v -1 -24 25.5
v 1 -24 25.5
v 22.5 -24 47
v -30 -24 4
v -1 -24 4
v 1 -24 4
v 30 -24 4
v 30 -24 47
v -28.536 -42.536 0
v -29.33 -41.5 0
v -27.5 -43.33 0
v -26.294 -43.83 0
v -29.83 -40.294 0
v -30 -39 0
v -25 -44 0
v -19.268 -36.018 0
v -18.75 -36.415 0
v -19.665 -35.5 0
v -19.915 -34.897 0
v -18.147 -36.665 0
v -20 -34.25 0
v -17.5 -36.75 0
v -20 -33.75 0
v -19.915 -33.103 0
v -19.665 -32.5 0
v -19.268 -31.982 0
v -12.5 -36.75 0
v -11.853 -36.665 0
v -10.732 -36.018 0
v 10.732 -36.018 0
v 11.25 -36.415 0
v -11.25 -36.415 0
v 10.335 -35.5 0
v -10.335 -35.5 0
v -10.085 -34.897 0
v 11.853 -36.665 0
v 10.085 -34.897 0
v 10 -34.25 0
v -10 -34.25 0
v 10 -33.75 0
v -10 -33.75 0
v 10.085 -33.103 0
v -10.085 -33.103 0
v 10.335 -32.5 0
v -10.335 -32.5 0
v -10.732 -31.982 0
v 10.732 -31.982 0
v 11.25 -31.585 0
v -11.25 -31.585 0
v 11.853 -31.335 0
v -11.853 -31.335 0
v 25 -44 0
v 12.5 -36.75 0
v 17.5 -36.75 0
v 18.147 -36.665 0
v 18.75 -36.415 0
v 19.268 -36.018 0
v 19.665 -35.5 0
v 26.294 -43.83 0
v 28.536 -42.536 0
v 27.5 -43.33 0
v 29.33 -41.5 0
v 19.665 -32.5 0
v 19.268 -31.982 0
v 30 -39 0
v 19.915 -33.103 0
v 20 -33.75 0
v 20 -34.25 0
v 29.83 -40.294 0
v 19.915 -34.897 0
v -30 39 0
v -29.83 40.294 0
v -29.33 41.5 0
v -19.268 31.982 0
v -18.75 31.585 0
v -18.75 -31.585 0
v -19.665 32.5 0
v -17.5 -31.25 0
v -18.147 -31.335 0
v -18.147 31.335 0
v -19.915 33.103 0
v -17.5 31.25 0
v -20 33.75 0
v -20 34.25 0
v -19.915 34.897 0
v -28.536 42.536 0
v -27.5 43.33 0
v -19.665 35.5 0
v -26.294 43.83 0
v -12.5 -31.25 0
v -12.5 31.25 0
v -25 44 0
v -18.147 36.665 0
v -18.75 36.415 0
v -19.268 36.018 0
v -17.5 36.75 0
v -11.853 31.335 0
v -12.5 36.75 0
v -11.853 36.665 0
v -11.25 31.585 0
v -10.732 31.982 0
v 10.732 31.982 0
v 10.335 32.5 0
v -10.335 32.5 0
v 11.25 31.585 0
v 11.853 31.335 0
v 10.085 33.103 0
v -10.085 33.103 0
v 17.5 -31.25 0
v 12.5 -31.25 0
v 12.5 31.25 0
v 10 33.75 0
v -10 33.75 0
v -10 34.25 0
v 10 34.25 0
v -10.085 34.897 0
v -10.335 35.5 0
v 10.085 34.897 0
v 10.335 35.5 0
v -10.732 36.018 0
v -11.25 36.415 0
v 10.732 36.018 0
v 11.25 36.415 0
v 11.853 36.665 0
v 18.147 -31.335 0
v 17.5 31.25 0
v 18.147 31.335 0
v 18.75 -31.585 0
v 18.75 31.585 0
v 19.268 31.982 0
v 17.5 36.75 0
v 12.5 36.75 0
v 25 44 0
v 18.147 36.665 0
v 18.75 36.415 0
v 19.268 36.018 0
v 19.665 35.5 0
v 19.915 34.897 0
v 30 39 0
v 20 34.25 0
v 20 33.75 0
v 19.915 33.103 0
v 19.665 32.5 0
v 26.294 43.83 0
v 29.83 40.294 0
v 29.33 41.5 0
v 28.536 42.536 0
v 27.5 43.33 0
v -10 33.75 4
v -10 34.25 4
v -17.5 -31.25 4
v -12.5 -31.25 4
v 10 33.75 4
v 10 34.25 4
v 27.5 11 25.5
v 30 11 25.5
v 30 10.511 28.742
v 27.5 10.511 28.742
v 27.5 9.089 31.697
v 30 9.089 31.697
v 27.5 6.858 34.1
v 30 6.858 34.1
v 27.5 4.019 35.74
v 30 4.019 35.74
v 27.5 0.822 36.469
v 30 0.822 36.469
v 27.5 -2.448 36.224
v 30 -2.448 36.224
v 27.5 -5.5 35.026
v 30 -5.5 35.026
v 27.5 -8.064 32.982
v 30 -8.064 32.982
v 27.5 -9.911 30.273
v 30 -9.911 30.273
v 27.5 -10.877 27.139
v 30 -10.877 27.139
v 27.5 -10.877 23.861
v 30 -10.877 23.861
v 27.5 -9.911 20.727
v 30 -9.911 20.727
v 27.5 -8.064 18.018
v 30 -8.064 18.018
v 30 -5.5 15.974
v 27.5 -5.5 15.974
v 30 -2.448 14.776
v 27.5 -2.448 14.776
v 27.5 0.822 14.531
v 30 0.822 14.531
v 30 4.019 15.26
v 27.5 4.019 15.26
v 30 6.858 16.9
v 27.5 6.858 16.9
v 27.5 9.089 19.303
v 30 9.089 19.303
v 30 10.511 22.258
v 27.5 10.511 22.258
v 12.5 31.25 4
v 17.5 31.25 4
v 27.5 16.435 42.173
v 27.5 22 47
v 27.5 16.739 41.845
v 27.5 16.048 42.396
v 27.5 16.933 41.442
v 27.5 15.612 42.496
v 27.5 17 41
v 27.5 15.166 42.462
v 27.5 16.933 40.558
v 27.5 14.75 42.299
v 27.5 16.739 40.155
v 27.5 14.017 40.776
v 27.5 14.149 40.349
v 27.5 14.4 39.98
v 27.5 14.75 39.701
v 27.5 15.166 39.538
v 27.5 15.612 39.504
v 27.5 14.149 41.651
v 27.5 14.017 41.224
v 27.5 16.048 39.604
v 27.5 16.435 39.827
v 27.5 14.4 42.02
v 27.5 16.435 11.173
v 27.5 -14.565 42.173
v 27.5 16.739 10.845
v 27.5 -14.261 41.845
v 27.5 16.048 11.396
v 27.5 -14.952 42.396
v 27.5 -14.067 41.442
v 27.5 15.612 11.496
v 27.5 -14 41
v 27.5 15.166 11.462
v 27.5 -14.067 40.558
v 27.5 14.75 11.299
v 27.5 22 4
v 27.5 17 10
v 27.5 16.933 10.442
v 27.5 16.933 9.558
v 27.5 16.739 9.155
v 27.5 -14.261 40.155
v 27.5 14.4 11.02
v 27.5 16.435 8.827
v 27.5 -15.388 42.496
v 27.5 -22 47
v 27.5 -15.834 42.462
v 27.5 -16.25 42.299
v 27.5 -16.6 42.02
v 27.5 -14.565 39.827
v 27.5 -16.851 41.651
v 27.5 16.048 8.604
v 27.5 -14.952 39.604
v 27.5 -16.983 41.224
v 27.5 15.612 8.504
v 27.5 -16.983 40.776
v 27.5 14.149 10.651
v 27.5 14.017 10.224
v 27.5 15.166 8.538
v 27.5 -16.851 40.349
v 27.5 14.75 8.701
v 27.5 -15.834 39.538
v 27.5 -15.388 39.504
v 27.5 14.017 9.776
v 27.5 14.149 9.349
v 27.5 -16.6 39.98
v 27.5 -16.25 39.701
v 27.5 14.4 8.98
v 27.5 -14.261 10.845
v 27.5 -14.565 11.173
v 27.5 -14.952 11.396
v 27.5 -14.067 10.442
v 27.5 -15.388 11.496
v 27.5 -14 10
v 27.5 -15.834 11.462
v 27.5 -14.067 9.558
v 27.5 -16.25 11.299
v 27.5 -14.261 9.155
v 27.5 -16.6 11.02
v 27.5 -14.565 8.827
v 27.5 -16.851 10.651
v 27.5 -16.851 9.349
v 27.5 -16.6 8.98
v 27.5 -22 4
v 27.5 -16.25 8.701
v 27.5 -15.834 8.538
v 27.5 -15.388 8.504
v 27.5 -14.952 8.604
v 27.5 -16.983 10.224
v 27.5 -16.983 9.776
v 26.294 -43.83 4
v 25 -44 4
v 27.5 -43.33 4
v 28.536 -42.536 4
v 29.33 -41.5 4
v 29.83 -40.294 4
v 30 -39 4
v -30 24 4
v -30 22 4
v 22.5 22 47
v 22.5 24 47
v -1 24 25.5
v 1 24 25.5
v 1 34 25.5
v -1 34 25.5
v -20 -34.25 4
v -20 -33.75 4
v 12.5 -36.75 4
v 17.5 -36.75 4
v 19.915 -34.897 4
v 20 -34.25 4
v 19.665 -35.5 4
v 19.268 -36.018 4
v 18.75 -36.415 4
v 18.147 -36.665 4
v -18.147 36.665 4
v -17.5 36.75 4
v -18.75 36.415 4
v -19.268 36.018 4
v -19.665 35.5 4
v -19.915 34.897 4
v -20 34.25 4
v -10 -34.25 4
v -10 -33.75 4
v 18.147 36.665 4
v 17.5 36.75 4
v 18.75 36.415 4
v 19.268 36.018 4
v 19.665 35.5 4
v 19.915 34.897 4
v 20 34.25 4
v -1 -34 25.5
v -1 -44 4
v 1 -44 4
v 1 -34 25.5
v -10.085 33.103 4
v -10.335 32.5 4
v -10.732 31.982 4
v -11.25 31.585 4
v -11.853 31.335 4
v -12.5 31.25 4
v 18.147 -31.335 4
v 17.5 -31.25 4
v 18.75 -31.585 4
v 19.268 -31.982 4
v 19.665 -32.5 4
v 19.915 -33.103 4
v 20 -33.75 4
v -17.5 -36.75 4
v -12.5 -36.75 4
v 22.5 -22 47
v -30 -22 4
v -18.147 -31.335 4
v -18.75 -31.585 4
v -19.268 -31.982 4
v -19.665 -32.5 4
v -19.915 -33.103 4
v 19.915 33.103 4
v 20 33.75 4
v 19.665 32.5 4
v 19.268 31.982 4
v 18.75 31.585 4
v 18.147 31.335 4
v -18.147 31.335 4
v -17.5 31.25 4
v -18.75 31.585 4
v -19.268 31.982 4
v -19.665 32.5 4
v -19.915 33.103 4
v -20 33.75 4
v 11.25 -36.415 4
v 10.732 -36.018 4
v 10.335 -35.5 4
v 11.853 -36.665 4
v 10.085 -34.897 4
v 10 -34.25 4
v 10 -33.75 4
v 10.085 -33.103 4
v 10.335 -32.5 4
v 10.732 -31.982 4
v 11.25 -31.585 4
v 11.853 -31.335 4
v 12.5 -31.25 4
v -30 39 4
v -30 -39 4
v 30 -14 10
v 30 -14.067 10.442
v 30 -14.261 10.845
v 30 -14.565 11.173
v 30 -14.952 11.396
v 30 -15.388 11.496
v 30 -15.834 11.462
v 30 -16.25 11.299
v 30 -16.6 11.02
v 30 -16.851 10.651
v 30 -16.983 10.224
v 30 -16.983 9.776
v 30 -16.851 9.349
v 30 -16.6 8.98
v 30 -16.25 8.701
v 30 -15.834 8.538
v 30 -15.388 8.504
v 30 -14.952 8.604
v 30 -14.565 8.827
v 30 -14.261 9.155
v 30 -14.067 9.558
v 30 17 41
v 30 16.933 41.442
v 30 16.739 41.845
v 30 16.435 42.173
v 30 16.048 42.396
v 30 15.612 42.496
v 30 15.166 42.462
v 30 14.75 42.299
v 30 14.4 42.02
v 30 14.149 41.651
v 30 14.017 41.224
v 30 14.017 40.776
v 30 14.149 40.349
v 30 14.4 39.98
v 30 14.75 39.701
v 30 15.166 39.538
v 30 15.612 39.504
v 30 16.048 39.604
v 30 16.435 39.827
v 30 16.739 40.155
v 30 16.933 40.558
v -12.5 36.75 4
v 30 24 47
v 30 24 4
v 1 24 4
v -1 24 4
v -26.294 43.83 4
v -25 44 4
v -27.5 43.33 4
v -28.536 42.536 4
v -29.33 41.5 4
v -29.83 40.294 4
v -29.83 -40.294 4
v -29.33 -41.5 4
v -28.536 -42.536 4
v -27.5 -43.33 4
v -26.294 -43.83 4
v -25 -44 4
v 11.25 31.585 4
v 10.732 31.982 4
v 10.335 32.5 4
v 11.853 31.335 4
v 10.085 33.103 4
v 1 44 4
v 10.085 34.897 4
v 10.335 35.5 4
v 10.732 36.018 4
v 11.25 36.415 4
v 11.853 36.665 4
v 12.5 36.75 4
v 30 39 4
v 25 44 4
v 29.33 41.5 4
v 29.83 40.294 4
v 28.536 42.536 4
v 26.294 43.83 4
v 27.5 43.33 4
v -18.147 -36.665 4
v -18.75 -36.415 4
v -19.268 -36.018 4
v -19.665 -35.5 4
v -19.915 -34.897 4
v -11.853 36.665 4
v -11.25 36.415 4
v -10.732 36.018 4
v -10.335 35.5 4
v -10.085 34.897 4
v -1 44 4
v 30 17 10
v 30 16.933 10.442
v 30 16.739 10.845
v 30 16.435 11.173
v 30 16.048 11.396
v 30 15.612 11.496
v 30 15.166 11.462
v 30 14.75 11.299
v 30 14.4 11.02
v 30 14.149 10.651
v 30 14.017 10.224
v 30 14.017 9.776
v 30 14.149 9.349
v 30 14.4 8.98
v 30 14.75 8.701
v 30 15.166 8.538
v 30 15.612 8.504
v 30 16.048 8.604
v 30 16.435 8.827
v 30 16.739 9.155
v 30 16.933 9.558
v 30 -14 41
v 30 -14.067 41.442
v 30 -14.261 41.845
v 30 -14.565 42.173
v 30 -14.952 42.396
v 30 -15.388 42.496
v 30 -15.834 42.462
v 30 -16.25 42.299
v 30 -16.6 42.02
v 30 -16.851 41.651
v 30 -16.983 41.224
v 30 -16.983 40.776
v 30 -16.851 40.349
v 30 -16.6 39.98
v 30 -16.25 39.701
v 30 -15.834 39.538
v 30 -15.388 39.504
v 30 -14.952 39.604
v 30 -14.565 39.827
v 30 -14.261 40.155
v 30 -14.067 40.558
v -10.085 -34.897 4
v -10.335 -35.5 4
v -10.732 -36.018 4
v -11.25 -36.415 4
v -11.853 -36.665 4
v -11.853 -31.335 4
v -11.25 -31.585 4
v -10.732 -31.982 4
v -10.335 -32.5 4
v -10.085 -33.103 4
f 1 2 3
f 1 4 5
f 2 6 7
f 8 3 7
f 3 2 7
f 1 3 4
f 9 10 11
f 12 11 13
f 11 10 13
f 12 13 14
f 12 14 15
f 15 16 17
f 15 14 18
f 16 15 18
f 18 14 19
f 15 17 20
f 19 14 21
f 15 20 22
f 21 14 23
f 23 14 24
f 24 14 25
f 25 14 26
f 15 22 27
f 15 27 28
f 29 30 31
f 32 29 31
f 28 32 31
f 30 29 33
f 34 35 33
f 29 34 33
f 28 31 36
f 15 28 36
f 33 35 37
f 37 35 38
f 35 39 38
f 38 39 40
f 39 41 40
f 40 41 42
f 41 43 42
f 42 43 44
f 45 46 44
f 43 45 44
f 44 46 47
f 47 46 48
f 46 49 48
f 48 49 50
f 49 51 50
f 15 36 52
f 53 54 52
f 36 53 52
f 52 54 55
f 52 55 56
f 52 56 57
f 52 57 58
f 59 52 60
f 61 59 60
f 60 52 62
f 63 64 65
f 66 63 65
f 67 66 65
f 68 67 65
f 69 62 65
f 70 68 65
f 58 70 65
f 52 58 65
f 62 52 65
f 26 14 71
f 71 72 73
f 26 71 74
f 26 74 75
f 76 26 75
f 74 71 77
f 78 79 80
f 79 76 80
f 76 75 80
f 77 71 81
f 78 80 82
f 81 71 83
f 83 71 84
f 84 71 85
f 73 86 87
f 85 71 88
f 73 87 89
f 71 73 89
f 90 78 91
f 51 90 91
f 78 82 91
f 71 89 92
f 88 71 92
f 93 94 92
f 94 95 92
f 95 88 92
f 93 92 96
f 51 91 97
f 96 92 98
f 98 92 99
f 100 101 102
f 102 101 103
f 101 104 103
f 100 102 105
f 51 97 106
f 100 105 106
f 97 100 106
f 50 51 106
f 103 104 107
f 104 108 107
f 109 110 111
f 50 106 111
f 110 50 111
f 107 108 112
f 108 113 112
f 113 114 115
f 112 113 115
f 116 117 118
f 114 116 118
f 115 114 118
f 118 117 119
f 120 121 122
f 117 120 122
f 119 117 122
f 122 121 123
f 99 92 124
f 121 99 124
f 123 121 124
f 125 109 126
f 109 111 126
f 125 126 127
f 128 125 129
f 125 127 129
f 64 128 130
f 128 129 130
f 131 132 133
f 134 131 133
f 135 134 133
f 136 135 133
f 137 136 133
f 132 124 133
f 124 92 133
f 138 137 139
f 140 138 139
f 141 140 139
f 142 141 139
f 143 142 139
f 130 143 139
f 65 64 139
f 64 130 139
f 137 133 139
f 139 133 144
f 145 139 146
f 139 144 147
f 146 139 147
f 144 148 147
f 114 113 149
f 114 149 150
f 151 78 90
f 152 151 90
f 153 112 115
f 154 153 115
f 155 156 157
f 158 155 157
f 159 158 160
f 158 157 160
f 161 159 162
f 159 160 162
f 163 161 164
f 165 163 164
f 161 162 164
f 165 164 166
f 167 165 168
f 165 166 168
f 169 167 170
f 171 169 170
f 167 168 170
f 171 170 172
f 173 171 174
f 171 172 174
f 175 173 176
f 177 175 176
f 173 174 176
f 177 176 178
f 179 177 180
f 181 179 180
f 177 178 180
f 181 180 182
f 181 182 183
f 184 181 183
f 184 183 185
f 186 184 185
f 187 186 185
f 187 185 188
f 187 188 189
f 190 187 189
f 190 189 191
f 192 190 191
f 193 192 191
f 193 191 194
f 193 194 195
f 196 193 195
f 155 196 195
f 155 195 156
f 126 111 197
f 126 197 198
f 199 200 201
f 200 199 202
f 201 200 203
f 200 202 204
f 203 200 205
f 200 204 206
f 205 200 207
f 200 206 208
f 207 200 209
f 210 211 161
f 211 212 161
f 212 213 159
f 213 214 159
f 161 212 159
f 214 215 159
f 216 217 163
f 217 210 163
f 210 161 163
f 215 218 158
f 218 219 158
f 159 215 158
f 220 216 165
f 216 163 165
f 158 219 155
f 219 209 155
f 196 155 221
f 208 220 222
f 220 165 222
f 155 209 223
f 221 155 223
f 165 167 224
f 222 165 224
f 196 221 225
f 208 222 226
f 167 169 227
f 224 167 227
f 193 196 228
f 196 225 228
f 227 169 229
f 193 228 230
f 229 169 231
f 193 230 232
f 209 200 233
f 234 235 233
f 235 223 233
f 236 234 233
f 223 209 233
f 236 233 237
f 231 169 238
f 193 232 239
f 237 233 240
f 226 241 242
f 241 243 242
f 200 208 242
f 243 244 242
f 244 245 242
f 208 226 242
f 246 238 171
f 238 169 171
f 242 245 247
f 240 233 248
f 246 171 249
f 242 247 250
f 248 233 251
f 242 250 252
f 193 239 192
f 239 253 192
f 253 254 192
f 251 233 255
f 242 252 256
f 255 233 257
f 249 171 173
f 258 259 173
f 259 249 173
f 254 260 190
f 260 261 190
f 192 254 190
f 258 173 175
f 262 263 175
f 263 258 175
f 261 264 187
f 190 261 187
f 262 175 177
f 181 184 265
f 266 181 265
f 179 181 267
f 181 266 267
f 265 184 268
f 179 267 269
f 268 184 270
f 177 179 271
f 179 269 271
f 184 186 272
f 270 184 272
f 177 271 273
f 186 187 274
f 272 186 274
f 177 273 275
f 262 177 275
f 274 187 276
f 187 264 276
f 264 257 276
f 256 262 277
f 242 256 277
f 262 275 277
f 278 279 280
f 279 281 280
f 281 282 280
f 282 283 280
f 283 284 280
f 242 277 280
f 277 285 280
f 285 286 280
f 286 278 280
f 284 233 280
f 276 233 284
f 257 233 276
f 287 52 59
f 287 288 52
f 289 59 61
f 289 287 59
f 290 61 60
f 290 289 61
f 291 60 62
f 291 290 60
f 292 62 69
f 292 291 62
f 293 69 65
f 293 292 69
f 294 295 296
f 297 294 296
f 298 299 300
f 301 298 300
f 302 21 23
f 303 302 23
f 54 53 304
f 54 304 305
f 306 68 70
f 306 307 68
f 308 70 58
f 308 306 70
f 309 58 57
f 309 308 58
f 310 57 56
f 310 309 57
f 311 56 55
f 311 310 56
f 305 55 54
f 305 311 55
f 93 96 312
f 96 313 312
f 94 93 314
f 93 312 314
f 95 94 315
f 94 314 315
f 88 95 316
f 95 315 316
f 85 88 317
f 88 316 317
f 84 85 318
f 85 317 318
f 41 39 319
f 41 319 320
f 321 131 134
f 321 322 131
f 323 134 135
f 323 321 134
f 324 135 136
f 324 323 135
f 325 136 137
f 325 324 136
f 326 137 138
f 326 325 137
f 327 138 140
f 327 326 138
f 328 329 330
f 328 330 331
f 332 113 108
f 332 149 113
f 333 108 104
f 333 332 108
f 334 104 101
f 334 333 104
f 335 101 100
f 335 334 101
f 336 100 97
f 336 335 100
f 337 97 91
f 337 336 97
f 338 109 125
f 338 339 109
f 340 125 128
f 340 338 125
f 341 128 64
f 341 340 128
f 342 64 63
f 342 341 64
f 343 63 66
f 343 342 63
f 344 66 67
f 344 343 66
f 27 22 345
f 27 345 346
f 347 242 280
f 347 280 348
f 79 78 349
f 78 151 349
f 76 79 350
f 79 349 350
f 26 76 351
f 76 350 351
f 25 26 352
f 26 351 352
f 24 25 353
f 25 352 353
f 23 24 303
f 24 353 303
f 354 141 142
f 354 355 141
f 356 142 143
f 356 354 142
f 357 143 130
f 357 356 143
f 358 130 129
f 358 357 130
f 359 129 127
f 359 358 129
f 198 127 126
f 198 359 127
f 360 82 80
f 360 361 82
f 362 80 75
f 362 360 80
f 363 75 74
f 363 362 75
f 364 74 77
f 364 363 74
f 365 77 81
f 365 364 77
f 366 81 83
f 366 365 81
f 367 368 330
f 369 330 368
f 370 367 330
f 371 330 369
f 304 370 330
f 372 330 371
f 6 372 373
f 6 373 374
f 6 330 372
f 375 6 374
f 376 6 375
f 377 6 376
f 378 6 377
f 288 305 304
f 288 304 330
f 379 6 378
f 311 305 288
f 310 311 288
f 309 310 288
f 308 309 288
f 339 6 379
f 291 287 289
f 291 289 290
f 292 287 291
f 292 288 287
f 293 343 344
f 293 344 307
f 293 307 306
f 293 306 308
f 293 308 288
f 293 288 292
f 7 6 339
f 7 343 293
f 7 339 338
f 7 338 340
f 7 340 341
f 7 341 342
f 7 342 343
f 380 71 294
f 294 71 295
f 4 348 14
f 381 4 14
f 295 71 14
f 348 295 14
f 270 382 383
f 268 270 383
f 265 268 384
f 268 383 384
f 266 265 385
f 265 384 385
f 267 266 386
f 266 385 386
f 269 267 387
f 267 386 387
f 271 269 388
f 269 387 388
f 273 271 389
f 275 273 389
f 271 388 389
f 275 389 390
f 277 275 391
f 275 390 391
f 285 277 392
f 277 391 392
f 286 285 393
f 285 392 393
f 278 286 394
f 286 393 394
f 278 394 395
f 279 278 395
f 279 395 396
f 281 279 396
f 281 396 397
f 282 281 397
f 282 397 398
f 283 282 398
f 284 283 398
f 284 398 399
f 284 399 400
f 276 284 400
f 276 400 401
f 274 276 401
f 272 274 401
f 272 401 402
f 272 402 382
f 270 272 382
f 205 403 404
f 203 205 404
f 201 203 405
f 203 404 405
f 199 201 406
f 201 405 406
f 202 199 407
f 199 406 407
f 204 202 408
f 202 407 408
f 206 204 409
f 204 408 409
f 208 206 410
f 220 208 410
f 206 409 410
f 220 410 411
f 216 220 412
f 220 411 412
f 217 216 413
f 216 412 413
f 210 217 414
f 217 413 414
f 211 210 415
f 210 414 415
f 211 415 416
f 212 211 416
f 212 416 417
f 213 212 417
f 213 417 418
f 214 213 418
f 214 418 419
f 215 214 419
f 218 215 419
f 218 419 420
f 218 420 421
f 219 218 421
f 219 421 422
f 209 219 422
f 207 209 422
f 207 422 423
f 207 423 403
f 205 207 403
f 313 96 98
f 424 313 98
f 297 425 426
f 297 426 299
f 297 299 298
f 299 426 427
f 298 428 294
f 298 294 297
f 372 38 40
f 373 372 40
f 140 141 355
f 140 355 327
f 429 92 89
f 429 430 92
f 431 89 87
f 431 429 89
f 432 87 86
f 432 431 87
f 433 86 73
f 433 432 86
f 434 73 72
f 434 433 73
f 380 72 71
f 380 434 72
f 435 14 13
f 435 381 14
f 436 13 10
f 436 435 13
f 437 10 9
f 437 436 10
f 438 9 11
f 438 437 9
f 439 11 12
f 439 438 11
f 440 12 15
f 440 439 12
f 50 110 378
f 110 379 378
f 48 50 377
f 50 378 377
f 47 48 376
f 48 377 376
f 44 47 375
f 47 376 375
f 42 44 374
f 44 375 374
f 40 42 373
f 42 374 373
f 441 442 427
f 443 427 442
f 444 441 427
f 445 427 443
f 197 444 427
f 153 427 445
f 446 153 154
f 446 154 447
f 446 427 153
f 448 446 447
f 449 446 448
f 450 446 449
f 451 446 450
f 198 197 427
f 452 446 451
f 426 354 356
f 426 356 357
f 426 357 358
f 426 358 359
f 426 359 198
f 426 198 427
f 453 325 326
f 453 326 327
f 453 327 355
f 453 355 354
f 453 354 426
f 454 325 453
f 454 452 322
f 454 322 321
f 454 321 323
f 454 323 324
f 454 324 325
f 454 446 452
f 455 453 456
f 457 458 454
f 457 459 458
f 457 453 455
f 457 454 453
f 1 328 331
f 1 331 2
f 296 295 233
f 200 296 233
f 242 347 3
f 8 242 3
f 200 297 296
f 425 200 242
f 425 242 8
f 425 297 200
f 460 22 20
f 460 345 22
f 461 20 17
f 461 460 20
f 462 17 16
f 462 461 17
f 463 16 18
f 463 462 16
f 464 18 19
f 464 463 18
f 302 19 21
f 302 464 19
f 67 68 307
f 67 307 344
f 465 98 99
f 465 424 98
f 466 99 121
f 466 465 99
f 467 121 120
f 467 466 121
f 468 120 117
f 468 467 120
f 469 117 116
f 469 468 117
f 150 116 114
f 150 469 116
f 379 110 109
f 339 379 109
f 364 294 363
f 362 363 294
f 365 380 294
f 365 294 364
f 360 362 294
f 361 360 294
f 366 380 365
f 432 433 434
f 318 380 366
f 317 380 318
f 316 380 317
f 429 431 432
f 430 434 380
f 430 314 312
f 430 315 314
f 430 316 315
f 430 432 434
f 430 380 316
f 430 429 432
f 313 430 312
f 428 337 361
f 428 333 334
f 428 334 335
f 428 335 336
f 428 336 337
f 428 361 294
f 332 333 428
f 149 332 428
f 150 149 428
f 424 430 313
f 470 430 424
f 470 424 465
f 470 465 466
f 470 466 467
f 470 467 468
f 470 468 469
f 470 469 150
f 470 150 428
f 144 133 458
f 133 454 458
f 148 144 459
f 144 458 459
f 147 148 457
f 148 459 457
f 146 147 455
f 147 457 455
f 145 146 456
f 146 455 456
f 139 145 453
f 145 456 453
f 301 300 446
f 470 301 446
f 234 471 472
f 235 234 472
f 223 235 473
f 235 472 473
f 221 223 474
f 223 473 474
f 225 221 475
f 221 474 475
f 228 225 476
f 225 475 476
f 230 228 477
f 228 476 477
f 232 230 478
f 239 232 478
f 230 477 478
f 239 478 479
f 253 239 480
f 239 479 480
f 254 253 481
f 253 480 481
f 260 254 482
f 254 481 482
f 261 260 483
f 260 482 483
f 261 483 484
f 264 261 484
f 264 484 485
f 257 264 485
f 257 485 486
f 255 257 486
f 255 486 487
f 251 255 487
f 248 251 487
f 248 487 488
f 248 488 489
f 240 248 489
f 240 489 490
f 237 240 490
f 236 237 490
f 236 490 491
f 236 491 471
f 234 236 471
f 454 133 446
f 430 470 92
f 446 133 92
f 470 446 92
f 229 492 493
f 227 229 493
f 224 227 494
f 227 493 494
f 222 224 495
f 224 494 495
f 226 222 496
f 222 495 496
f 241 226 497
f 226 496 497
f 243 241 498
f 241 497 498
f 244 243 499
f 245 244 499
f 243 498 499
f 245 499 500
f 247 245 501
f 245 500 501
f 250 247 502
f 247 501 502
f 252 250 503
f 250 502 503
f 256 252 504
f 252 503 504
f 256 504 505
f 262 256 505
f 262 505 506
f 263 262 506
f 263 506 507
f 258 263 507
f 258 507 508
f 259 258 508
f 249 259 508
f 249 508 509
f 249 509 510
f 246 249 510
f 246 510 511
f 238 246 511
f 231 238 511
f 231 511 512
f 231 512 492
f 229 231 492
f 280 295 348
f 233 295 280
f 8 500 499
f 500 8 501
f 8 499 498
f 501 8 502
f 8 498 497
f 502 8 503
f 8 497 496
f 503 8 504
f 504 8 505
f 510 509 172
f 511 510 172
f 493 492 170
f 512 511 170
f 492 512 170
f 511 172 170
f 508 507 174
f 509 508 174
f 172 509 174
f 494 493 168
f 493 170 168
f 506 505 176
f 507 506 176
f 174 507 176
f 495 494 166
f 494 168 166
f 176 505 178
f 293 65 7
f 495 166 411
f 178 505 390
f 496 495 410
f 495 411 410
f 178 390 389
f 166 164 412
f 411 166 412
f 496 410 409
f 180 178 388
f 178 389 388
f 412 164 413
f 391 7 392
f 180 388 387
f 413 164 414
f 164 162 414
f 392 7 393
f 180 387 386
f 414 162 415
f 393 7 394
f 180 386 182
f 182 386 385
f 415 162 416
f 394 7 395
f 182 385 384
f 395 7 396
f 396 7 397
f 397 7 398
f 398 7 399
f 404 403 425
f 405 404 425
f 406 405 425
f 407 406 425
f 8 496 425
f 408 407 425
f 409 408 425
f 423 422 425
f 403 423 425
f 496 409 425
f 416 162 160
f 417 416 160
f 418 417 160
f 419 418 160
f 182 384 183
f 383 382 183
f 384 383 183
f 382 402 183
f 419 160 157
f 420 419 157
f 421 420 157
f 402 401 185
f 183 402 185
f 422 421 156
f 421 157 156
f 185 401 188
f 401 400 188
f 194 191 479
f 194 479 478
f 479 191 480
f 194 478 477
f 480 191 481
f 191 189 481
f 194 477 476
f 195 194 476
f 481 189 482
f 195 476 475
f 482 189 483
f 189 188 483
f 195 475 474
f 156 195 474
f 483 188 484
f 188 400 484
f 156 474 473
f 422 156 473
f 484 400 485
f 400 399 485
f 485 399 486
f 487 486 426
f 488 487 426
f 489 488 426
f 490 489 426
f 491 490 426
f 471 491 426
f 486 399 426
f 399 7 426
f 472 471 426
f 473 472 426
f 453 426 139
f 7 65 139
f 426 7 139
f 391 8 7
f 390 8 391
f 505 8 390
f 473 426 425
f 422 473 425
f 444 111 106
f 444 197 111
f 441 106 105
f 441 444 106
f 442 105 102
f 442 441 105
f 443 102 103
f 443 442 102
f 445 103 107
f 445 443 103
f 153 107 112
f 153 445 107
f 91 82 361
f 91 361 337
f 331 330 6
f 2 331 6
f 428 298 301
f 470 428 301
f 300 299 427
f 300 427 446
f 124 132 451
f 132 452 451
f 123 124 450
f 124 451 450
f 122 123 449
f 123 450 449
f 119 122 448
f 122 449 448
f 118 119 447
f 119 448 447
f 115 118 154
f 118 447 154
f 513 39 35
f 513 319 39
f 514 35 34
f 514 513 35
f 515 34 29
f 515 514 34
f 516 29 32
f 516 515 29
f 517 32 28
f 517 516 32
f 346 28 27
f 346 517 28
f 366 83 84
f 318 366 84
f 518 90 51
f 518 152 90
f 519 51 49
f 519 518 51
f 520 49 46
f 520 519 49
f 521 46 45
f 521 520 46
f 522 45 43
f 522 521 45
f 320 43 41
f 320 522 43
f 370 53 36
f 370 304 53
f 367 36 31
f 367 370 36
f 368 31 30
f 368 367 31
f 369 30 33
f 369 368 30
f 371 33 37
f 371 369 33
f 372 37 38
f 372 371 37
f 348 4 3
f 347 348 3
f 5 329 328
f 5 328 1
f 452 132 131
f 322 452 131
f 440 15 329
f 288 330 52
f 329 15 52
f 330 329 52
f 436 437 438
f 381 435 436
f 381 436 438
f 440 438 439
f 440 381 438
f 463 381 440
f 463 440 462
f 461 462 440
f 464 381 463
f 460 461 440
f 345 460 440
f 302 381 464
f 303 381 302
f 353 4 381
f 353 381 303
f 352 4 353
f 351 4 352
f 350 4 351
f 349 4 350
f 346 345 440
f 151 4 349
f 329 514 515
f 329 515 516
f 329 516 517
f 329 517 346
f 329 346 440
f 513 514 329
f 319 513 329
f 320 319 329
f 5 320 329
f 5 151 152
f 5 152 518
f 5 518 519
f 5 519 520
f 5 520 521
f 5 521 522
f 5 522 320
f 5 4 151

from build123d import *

# Parameters (mm, degrees)
F0_W     = 29
F0_H     = 20
F0_W_2   = 10
F0_H_2   = 5.5
F0_W_3   = 2
F0_W_4   = 57.5
F0_H_3   = 44
F1_DEPTH = 4
F2_DEPTH = 47
F3_R     = 11
F3_R_2   = 1.5
F4_DEPTH = 25
F6_DEPTH = 12.5
F8_DEPTH = 50
F9_R     = 2.5
F10_R    = 5


with BuildPart() as f1:
    # F0 (on Top) → F1 (new body)
    with BuildSketch(Plane.XY):
        with Locations((15.5, -34)):
            Rectangle(F0_W, F0_H)
        with Locations((15, -34)):
            Rectangle(F0_W_2, F0_H_2, mode=Mode.SUBTRACT)
        Polygon((1, -24), (30, -24), (30, 24), (1, 24), (-1, 24), (-30, 24), (-30, 22), (27.5, 22), (27.5, -22), (-30, -22), (-30, -24), (-1, -24), align=None)
        with Locations((0, -34)):
            Rectangle(F0_W_3, F0_H)
        with Locations((15.5, 34)):
            Rectangle(F0_W, F0_H)
        with Locations((15, 34)):
            Rectangle(F0_W_2, F0_H_2, mode=Mode.SUBTRACT)
        with Locations((-15.5, -34)):
            Rectangle(F0_W, F0_H)
        with Locations((-15, -34)):
            Rectangle(F0_W_2, F0_H_2, mode=Mode.SUBTRACT)
        with Locations((0, 34)):
            Rectangle(F0_W_3, F0_H)
        with Locations((-15.5, 34)):
            Rectangle(F0_W, F0_H)
        with Locations((-15, 34)):
            Rectangle(F0_W_2, F0_H_2, mode=Mode.SUBTRACT)
        with Locations((-1.25, 0)):
            Rectangle(F0_W_4, F0_H_3)
    extrude(amount=F1_DEPTH)

    # F0 (on Top) → F2 (join)
    with BuildSketch(Plane.XY):
        Polygon((1, -24), (30, -24), (30, 24), (1, 24), (-1, 24), (-30, 24), (-30, 22), (27.5, 22), (27.5, -22), (-30, -22), (-30, -24), (-1, -24), align=None)
        with Locations((0, 34)):
            Rectangle(F0_W_3, F0_H)
        with Locations((0, -34)):
            Rectangle(F0_W_3, F0_H)
    extrude(amount=F2_DEPTH)

    # F3 (on face) → F4 (cut)
    with BuildSketch(Plane.YZ.offset(30)):
        with Locations((0, 25.5)):
            Circle(F3_R)
        with Locations((-15.5, 41)):
            Circle(F3_R_2)
        with Locations((15.5, 41)):
            Circle(F3_R_2)
        with Locations((15.5, 10)):
            Circle(F3_R_2)
        with Locations((-15.5, 10)):
            Circle(F3_R_2)
    extrude(amount=-F4_DEPTH, mode=Mode.SUBTRACT)

    # F5 (on Right) → F6 (cut, symmetric)
    with BuildSketch(Plane.YZ):
        Polygon((-44, 47), (-44, 4), (-34, 25.5), (-24, 47), align=None)
        Polygon((-24, 47), (-34, 25.5), (-24, 25.5), align=None)
        Polygon((34, 25.5), (44, 4), (44, 47), (24, 47), align=None)
        Polygon((24, 25.5), (34, 25.5), (24, 47), align=None)
    extrude(amount=F6_DEPTH, both=True, mode=Mode.SUBTRACT)

    # F7 (on Front) → F8 (cut, symmetric)
    with BuildSketch(Plane.XZ):
        Polygon((-30, 47), (-30, 4), (22.5, 47), align=None)
    extrude(amount=F8_DEPTH, both=True, mode=Mode.SUBTRACT)

    # F9
    f9_edges = [f1.edges().sort_by_distance(p)[0] for p in [
        (-20, 36.75, 2),
        (-20, 31.25, 2),
        (-10, 36.75, 2),
        (-10, 31.25, 2),
        (20, 31.25, 2),
        (20, -36.75, 2),
        (-10, -36.75, 2),
        (20, -31.25, 2),
        (-10, -31.25, 2),
        (20, 36.75, 2),
        (-20, -36.75, 2),
        (10, -36.75, 2),
        (10, 31.25, 2),
        (-20, -31.25, 2),
        (10, -31.25, 2),
        (10, 36.75, 2),
    ]]
    fillet(f9_edges, radius=F9_R)

    # F10
    f10_edges = [f1.edges().sort_by_distance(p)[0] for p in [
        (-30, -44, 2),
        (30, -44, 2),
        (30, 44, 2),
        (-30, 44, 2),
    ]]
    fillet(f10_edges, radius=F10_R)


solid = f1.part
